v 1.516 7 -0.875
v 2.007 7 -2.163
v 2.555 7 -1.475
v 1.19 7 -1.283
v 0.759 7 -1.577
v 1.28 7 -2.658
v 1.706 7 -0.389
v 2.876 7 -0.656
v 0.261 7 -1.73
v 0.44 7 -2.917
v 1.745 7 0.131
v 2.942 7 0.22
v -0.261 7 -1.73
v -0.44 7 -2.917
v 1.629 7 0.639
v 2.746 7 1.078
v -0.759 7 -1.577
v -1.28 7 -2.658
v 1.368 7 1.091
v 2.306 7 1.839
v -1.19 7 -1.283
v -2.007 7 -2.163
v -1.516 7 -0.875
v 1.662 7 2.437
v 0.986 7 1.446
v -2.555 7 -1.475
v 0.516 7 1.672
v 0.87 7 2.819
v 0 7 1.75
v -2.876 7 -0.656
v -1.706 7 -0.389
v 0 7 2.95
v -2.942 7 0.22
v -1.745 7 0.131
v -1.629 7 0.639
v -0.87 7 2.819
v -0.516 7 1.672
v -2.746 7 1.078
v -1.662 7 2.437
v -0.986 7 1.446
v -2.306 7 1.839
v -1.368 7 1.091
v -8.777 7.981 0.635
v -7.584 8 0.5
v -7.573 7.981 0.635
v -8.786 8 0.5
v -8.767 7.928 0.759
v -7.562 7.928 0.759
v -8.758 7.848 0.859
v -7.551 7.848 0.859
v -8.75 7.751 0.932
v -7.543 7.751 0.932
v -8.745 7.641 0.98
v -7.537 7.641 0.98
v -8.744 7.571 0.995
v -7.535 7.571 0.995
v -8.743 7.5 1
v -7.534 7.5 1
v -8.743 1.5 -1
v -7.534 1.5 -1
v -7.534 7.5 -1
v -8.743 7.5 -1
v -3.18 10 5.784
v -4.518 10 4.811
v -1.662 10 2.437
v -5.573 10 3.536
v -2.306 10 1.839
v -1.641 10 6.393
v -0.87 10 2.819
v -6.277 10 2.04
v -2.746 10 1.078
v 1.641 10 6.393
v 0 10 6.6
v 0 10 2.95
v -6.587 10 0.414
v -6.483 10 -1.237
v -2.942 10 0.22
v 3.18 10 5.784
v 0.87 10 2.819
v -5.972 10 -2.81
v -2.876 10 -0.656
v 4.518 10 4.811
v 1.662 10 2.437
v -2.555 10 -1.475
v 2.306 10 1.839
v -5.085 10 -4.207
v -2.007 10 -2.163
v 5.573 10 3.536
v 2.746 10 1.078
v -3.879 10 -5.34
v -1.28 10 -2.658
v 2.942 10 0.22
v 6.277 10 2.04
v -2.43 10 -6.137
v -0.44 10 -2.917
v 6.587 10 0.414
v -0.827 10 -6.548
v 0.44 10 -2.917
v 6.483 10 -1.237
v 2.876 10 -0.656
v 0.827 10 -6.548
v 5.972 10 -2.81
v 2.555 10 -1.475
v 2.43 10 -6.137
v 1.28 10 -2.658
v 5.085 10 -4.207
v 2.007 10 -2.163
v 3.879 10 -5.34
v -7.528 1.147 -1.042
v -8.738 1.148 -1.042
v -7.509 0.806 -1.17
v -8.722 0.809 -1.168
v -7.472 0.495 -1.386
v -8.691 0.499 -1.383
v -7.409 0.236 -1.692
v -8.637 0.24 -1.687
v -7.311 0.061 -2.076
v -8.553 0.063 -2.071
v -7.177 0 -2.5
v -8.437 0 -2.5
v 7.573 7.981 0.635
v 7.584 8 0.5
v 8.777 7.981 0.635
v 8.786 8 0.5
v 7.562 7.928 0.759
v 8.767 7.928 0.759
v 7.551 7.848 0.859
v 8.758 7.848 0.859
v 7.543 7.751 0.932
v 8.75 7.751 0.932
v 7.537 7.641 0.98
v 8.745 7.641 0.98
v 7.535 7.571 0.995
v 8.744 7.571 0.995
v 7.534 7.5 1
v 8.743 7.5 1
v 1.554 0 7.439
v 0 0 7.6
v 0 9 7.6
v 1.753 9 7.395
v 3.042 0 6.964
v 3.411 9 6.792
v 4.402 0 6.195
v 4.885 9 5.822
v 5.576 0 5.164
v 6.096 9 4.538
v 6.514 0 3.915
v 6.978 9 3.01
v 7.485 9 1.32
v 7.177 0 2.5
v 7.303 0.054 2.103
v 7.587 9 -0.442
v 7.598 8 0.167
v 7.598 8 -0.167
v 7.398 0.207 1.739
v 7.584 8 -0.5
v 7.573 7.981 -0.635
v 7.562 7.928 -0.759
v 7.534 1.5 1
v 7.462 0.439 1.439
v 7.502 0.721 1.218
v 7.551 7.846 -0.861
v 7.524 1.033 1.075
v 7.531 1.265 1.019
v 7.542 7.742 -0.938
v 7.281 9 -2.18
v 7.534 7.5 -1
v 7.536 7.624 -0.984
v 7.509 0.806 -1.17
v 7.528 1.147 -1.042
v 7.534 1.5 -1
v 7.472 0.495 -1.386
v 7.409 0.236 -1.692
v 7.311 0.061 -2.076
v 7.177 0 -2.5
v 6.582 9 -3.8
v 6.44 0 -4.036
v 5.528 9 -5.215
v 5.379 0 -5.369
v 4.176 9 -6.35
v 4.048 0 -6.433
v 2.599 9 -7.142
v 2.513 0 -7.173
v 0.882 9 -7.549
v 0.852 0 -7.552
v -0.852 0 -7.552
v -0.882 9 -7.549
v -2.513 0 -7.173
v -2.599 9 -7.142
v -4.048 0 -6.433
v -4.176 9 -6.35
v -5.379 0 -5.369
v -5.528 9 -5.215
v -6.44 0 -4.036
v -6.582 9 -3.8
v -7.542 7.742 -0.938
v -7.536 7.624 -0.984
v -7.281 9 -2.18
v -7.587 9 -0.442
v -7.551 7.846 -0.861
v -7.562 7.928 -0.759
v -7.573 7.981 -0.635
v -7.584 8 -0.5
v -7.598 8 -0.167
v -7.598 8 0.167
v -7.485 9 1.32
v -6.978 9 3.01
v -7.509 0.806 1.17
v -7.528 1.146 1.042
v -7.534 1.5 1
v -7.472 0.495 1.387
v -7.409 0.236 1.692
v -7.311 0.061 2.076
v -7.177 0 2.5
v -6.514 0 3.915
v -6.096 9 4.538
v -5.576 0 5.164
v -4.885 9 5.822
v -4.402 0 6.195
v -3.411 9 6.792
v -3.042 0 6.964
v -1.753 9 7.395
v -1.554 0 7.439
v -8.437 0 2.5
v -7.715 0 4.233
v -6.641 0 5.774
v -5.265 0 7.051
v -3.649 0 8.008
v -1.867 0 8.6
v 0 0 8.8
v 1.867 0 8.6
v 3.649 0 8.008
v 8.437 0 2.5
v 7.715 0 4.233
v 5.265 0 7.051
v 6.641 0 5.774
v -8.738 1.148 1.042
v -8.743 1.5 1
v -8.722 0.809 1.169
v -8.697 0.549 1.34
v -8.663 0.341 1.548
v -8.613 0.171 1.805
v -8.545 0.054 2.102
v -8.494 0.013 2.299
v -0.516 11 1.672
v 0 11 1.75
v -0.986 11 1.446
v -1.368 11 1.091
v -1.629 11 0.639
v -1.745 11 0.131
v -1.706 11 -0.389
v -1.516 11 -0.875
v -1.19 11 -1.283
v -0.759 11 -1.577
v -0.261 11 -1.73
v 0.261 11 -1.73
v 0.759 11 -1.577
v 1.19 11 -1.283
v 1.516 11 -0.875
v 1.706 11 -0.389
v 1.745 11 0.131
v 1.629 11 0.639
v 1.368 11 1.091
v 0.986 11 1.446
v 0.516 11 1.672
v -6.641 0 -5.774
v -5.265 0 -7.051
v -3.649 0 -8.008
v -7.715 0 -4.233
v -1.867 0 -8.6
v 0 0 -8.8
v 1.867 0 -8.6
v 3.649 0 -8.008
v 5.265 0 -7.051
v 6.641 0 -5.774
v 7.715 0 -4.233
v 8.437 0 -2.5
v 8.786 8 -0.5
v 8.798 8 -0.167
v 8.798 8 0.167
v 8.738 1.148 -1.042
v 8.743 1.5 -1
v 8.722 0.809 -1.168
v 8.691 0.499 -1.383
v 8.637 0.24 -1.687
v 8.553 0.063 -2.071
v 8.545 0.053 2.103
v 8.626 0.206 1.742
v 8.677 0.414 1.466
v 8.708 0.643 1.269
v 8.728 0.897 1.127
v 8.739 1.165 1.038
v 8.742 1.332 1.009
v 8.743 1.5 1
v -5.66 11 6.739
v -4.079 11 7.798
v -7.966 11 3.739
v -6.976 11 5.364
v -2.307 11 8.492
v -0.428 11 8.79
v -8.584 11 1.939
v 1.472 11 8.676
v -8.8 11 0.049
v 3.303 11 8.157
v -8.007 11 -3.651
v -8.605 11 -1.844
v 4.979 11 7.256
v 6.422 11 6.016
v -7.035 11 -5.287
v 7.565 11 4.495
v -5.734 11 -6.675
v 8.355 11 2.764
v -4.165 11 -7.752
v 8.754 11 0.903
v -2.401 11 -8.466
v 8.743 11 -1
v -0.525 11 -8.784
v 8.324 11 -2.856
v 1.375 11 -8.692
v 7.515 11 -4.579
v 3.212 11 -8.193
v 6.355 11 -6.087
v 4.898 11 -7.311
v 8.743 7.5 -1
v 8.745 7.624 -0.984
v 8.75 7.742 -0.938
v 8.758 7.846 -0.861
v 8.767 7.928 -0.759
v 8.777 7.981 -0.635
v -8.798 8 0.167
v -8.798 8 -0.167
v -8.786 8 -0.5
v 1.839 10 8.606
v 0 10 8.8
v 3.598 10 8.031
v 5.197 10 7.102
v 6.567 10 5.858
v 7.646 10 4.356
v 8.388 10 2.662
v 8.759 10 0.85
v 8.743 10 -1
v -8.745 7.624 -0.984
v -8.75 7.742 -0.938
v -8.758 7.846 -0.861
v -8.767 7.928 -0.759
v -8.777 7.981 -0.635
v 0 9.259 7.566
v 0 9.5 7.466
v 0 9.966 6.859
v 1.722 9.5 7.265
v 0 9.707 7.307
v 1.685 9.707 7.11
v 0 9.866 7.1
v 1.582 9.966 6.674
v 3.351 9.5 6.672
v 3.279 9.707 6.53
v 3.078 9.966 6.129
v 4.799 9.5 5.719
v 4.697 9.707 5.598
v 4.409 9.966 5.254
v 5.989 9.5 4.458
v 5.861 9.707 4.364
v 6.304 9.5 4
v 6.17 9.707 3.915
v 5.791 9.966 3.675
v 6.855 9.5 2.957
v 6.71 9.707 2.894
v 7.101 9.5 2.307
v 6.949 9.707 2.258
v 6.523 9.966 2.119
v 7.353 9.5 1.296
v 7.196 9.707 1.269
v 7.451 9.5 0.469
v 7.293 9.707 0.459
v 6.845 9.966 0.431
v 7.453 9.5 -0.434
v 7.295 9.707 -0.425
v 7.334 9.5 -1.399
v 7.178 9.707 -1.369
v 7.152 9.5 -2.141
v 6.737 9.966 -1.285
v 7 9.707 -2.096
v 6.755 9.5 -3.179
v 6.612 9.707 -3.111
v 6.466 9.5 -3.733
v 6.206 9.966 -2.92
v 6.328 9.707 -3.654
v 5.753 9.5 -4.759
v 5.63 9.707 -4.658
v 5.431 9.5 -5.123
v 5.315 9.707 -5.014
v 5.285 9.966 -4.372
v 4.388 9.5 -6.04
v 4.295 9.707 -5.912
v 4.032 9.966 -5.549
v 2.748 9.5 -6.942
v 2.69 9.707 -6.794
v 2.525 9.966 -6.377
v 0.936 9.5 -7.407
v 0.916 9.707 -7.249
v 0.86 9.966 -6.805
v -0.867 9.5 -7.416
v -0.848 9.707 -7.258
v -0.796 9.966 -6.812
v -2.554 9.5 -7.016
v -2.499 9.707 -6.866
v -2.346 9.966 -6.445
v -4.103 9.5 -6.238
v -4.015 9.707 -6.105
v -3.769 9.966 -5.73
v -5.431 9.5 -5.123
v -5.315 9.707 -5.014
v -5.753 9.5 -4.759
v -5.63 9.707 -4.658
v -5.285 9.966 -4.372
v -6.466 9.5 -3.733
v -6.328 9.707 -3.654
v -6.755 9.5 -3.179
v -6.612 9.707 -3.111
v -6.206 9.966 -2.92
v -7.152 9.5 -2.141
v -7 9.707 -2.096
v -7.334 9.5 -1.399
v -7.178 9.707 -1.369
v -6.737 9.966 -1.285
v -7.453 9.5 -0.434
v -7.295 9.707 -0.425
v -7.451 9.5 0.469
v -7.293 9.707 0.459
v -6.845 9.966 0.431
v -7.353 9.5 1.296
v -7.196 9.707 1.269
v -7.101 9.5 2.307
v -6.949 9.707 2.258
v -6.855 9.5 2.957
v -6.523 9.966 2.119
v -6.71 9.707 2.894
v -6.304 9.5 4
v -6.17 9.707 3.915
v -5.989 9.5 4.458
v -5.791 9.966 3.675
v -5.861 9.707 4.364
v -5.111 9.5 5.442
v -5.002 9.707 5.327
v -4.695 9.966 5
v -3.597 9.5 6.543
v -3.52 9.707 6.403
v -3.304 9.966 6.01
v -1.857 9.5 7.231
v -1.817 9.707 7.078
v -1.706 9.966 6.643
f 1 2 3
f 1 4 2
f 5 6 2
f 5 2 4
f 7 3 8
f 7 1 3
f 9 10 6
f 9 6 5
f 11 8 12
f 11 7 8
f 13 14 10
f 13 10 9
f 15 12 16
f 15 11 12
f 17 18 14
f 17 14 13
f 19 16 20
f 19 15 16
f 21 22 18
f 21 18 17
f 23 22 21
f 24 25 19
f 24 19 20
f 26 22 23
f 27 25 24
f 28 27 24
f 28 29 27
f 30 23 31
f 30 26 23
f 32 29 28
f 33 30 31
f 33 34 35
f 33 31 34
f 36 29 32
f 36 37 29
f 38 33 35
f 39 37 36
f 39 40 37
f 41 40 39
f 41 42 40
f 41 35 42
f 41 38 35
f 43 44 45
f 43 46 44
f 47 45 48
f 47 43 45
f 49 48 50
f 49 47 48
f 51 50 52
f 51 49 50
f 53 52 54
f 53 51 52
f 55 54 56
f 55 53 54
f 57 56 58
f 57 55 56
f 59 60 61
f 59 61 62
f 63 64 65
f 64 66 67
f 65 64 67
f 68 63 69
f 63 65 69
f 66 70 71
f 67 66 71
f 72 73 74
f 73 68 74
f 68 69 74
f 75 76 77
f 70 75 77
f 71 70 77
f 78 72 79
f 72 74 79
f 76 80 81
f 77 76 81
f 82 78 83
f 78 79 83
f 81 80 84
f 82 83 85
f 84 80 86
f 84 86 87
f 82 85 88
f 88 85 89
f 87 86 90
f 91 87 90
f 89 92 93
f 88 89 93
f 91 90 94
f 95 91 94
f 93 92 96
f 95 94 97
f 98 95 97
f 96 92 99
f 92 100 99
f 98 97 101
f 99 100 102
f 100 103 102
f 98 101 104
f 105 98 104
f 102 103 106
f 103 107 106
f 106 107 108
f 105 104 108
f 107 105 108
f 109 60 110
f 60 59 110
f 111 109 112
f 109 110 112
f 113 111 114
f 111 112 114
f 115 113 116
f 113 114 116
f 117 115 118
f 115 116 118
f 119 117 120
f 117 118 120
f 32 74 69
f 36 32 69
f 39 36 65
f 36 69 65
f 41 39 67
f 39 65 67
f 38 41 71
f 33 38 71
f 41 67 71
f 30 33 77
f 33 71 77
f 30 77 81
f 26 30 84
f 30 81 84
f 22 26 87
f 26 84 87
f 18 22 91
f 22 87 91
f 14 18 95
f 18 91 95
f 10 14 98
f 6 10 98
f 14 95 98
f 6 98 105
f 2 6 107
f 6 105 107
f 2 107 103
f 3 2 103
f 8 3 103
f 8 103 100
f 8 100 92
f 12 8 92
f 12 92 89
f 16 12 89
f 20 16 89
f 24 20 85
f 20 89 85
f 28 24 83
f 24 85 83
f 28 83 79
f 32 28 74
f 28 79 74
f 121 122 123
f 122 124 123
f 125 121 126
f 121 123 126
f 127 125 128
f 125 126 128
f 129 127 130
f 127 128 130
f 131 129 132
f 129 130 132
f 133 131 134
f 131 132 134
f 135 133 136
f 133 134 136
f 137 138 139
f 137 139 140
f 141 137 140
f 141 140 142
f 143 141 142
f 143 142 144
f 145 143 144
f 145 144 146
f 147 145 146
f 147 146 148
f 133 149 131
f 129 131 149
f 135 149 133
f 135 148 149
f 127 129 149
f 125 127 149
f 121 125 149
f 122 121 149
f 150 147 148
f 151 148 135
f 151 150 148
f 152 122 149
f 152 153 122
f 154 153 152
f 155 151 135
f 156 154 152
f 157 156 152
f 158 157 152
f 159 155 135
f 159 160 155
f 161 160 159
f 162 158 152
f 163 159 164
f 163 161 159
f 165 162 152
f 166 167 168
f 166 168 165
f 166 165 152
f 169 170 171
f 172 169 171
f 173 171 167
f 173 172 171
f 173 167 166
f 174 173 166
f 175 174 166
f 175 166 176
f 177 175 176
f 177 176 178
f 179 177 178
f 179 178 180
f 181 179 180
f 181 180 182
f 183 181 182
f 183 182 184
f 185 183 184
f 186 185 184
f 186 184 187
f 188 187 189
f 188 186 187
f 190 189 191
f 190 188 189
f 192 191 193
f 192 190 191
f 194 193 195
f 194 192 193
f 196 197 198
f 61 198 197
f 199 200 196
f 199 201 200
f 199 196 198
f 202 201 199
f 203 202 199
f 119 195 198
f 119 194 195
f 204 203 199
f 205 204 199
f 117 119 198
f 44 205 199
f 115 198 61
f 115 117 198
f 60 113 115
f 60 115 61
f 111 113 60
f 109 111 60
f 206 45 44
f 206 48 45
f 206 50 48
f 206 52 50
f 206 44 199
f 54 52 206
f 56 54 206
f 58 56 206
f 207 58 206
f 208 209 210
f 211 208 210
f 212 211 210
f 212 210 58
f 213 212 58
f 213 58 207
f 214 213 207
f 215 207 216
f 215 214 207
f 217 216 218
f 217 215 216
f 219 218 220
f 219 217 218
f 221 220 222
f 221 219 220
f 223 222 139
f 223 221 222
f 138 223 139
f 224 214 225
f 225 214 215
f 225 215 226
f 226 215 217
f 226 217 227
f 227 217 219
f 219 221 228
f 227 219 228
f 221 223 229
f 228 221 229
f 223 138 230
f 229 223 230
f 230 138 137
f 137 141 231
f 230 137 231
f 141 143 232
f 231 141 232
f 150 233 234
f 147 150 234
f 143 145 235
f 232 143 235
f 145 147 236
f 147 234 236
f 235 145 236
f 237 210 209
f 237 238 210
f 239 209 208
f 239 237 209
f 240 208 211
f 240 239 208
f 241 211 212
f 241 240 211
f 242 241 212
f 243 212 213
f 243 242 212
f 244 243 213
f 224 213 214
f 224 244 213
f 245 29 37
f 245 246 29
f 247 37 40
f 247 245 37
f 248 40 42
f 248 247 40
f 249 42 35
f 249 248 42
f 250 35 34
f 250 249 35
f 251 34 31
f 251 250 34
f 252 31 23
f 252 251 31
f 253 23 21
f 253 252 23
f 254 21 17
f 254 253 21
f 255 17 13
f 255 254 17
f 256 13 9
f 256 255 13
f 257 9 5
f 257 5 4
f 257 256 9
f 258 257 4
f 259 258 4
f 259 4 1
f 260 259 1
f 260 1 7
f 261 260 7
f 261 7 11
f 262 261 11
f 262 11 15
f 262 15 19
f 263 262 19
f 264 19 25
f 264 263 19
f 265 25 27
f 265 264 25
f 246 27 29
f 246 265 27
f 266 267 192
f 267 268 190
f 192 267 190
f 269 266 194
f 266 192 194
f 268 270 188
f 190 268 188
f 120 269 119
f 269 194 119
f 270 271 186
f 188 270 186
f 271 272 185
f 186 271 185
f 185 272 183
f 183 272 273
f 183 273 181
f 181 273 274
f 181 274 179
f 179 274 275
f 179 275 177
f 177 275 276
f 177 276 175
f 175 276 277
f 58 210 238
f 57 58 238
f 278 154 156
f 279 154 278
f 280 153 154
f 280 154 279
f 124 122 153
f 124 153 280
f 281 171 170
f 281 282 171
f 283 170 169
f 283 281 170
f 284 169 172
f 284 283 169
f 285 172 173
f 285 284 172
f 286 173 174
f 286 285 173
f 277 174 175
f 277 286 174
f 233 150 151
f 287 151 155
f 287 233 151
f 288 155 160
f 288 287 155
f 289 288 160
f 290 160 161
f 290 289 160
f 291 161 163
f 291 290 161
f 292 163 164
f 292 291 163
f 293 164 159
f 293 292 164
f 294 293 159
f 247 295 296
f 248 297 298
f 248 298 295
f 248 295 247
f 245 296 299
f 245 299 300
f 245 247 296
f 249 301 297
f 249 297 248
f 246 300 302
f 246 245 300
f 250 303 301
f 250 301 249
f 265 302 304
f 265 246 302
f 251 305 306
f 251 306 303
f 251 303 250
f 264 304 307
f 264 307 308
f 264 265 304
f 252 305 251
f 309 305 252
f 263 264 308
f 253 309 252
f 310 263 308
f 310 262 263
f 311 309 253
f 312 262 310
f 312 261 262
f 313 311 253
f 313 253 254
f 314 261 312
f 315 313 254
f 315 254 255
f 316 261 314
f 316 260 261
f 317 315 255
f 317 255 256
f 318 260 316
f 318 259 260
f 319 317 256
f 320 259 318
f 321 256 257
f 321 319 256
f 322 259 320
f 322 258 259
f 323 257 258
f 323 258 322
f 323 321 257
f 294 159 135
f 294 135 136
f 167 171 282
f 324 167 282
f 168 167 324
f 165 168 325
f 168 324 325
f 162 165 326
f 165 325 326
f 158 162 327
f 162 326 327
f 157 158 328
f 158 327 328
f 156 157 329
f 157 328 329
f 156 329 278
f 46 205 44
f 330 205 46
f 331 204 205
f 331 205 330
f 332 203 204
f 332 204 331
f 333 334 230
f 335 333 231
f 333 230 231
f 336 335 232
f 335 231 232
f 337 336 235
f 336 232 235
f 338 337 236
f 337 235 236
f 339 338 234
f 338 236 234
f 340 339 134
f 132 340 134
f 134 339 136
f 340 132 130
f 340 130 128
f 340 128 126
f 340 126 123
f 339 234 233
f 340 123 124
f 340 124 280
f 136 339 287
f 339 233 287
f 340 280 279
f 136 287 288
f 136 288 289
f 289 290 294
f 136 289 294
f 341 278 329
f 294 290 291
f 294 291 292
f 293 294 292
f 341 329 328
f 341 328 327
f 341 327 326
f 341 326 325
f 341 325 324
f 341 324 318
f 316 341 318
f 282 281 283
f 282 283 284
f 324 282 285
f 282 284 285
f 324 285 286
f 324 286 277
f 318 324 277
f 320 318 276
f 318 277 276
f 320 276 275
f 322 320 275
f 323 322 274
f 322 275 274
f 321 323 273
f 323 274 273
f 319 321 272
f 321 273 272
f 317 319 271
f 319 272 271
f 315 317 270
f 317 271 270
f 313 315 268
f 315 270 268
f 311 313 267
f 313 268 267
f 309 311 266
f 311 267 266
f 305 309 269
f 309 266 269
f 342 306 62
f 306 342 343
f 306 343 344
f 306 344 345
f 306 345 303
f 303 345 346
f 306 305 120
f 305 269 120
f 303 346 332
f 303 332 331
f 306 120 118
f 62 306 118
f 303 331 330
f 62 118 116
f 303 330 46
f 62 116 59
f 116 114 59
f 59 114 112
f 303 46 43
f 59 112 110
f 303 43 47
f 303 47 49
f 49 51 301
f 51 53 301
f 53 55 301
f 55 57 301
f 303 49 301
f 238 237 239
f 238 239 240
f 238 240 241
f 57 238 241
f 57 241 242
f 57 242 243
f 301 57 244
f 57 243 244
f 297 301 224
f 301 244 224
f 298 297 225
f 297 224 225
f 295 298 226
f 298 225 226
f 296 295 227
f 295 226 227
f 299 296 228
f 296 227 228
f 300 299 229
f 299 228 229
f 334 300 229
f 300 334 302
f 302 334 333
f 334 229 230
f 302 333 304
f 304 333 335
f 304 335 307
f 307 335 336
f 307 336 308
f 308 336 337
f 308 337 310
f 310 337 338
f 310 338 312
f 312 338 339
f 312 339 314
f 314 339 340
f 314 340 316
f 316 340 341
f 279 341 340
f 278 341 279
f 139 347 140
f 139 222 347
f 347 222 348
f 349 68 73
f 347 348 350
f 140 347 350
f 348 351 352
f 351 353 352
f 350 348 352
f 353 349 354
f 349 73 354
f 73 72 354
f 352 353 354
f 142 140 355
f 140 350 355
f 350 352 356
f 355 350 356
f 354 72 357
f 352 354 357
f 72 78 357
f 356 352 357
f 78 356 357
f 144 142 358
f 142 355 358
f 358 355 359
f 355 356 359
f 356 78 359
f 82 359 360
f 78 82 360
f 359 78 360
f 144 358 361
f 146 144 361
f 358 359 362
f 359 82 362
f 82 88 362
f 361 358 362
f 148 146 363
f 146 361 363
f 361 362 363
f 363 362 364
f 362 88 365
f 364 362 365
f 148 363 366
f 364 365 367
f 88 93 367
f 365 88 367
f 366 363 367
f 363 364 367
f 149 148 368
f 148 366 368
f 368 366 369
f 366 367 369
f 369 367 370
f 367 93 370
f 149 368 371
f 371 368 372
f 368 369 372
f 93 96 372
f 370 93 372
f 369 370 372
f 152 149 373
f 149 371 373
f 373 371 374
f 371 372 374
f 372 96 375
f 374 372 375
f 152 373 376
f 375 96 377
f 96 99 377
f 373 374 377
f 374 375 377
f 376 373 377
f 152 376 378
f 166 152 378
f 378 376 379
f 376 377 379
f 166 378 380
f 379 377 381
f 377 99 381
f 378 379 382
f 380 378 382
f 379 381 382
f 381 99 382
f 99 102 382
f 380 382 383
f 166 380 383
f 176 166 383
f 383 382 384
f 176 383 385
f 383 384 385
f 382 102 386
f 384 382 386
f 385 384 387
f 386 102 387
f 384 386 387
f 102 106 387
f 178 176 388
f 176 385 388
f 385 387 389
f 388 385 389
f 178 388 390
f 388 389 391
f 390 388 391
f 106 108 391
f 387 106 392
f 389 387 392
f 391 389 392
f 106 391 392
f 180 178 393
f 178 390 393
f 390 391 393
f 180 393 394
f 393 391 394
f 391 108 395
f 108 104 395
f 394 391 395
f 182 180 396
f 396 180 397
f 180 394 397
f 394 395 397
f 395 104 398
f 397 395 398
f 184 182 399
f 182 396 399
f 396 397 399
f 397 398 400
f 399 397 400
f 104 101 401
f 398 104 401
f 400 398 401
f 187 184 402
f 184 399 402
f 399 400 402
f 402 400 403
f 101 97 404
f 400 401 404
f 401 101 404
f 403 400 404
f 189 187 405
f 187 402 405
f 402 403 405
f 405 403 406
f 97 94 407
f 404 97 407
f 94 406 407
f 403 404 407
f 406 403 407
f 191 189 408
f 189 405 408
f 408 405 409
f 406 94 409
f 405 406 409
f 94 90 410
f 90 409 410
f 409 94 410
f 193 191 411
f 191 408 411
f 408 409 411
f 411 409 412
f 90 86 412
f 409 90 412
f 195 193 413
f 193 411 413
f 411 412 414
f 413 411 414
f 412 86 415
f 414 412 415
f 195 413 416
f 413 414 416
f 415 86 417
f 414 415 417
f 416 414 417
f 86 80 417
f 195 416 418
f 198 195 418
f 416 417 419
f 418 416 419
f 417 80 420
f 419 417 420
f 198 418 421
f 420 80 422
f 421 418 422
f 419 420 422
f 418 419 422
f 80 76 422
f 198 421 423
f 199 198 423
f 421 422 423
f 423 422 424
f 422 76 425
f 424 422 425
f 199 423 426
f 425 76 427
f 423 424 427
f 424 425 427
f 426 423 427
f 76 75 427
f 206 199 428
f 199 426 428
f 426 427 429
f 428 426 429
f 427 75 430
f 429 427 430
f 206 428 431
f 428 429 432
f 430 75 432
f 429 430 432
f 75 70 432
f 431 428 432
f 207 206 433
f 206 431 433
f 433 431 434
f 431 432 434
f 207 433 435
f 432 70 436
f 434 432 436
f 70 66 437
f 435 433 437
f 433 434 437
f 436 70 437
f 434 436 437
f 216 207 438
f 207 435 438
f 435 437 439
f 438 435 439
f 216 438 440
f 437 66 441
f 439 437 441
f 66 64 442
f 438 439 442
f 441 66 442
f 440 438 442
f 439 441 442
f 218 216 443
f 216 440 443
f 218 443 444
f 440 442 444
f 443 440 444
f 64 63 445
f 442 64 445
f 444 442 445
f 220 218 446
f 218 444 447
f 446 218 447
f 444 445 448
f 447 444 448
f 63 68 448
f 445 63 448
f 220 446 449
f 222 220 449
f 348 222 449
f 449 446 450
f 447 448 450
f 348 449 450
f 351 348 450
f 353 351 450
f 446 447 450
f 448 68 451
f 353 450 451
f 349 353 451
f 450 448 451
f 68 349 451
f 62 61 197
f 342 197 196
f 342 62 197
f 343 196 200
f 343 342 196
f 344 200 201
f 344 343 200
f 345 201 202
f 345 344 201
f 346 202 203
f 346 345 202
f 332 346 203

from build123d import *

# Parameters (mm, degrees)
SKETCH1_R                = 8.8
SKETCH1_R_2              = 7.6
BOSS_EXTRUDE1_DEPTH      = 10
SKETCH2_W                = 18.171732103
SKETCH2_H                = 2
CUT_EXTRUDE1_DEPTH       = 8
SKETCH3_R                = 8.8
BOSS_EXTRUDE2_DEPTH      = 1
SKETCH4_R                = 1.75
CUT_EXTRUDE2_DEPTH       = 17.609635758
FILLET1_R                = 0.5
FILLET3_R                = 1.5
CIRPATTERN1_COUNT        = 2
FILLET1_OF_CIRPATTERN1_R = 0.5
FILLET3_OF_CIRPATTERN1_R = 1.5
SKETCH5_R                = 2.95
SKETCH5_R_2              = 1.75
BOSS_EXTRUDE3_DEPTH      = 3
FILLET6_R                = 1


with BuildPart() as part:
    # Sketch1 → Boss-Extrude1 (new body)
    with BuildSketch(Plane(origin=(0, 0, 0), x_dir=(1, 0, 0), z_dir=(0, 1, 0))):
        with Locations(Location((0, 0, 0), (0, 0, 270))):
            Circle(SKETCH1_R)
        with Locations(Location((0, 0, 0), (0, 0, 270))):
            Circle(SKETCH1_R_2, mode=Mode.SUBTRACT)
    extrude(amount=BOSS_EXTRUDE1_DEPTH)

    # Sketch2 → Cut-Extrude1 (cut)
    with BuildSketch(Plane.XZ):
        with Locations((9.085866052, 0)):
            Rectangle(SKETCH2_W, SKETCH2_H)
    cut_extrude1 = extrude(amount=-CUT_EXTRUDE1_DEPTH, mode=Mode.SUBTRACT)

    # Sketch3 → Boss-Extrude2 (add)
    with BuildSketch(Plane(origin=(0, 10, 0), x_dir=(1, 0, 0), z_dir=(0, 1, 0))):
        with Locations(Location((0, 0, 0), (0, 0, 6.524978844))):
            Circle(SKETCH3_R)
    extrude(amount=BOSS_EXTRUDE2_DEPTH)

    # Sketch4 → Cut-Extrude2 (cut, through all)
    with BuildSketch(Plane(origin=(0, 11, 0), x_dir=(1, 0, 0), z_dir=(0, 1, 0))):
        with Locations(Location((0, 0, 0), (0, 0, 270))):
            Circle(SKETCH4_R)
    extrude(amount=-CUT_EXTRUDE2_DEPTH, mode=Mode.SUBTRACT)

    # Fillet1
    fillet1_edges = [part.edges().sort_by_distance(p)[0] for p in [
        (8.138460239, 8, -1),
        (8.138460239, 8, 1),
    ]]
    fillet(fillet1_edges, radius=FILLET1_R)

    # Fillet3
    fillet3_edges = [part.edges().sort_by_distance(p)[0] for p in [
        (8.138460239, 0, 1),
        (8.138460239, 0, -1),
    ]]
    fillet(fillet3_edges, radius=FILLET3_R)

    # CirPattern1: Cut-Extrude1 ×2 about axis
    cirpattern1_axis = Axis((0, 0, 0), (0, -1, 0))
    for i in range(1, CIRPATTERN1_COUNT):
        add(cut_extrude1.rotate(cirpattern1_axis, i * 360 / CIRPATTERN1_COUNT), mode=Mode.SUBTRACT)

    # Fillet1 of CirPattern1
    fillet1_of_cirpattern1_edges = [part.edges().sort_by_distance(p)[0] for p in [
        (-8.138460239, 8, 1),
        (-8.138460239, 8, -1),
    ]]
    fillet(fillet1_of_cirpattern1_edges, radius=FILLET1_OF_CIRPATTERN1_R)

    # Fillet3 of CirPattern1
    fillet3_of_cirpattern1_edges = [part.edges().sort_by_distance(p)[0] for p in [
        (-8.138460239, 0, -1),
        (-8.138460239, 0, 1),
    ]]
    fillet(fillet3_of_cirpattern1_edges, radius=FILLET3_OF_CIRPATTERN1_R)

    # Sketch5 → Boss-Extrude3 (add)
    with BuildSketch(Plane.XZ.offset(-10)):
        with Locations(Location((0, 0, 0), (0, 0, 90))):
            Circle(SKETCH5_R)
        with Locations(Location((0, 0, 0), (0, 0, 90))):
            Circle(SKETCH5_R_2, mode=Mode.SUBTRACT)
    extrude(amount=BOSS_EXTRUDE3_DEPTH)

    # Fillet6
    fillet6_edges = [part.edges().sort_by_distance(p)[0] for p in [
        (0, 10, -7.6),
    ]]
    fillet(fillet6_edges, radius=FILLET6_R)


solid = part.part
